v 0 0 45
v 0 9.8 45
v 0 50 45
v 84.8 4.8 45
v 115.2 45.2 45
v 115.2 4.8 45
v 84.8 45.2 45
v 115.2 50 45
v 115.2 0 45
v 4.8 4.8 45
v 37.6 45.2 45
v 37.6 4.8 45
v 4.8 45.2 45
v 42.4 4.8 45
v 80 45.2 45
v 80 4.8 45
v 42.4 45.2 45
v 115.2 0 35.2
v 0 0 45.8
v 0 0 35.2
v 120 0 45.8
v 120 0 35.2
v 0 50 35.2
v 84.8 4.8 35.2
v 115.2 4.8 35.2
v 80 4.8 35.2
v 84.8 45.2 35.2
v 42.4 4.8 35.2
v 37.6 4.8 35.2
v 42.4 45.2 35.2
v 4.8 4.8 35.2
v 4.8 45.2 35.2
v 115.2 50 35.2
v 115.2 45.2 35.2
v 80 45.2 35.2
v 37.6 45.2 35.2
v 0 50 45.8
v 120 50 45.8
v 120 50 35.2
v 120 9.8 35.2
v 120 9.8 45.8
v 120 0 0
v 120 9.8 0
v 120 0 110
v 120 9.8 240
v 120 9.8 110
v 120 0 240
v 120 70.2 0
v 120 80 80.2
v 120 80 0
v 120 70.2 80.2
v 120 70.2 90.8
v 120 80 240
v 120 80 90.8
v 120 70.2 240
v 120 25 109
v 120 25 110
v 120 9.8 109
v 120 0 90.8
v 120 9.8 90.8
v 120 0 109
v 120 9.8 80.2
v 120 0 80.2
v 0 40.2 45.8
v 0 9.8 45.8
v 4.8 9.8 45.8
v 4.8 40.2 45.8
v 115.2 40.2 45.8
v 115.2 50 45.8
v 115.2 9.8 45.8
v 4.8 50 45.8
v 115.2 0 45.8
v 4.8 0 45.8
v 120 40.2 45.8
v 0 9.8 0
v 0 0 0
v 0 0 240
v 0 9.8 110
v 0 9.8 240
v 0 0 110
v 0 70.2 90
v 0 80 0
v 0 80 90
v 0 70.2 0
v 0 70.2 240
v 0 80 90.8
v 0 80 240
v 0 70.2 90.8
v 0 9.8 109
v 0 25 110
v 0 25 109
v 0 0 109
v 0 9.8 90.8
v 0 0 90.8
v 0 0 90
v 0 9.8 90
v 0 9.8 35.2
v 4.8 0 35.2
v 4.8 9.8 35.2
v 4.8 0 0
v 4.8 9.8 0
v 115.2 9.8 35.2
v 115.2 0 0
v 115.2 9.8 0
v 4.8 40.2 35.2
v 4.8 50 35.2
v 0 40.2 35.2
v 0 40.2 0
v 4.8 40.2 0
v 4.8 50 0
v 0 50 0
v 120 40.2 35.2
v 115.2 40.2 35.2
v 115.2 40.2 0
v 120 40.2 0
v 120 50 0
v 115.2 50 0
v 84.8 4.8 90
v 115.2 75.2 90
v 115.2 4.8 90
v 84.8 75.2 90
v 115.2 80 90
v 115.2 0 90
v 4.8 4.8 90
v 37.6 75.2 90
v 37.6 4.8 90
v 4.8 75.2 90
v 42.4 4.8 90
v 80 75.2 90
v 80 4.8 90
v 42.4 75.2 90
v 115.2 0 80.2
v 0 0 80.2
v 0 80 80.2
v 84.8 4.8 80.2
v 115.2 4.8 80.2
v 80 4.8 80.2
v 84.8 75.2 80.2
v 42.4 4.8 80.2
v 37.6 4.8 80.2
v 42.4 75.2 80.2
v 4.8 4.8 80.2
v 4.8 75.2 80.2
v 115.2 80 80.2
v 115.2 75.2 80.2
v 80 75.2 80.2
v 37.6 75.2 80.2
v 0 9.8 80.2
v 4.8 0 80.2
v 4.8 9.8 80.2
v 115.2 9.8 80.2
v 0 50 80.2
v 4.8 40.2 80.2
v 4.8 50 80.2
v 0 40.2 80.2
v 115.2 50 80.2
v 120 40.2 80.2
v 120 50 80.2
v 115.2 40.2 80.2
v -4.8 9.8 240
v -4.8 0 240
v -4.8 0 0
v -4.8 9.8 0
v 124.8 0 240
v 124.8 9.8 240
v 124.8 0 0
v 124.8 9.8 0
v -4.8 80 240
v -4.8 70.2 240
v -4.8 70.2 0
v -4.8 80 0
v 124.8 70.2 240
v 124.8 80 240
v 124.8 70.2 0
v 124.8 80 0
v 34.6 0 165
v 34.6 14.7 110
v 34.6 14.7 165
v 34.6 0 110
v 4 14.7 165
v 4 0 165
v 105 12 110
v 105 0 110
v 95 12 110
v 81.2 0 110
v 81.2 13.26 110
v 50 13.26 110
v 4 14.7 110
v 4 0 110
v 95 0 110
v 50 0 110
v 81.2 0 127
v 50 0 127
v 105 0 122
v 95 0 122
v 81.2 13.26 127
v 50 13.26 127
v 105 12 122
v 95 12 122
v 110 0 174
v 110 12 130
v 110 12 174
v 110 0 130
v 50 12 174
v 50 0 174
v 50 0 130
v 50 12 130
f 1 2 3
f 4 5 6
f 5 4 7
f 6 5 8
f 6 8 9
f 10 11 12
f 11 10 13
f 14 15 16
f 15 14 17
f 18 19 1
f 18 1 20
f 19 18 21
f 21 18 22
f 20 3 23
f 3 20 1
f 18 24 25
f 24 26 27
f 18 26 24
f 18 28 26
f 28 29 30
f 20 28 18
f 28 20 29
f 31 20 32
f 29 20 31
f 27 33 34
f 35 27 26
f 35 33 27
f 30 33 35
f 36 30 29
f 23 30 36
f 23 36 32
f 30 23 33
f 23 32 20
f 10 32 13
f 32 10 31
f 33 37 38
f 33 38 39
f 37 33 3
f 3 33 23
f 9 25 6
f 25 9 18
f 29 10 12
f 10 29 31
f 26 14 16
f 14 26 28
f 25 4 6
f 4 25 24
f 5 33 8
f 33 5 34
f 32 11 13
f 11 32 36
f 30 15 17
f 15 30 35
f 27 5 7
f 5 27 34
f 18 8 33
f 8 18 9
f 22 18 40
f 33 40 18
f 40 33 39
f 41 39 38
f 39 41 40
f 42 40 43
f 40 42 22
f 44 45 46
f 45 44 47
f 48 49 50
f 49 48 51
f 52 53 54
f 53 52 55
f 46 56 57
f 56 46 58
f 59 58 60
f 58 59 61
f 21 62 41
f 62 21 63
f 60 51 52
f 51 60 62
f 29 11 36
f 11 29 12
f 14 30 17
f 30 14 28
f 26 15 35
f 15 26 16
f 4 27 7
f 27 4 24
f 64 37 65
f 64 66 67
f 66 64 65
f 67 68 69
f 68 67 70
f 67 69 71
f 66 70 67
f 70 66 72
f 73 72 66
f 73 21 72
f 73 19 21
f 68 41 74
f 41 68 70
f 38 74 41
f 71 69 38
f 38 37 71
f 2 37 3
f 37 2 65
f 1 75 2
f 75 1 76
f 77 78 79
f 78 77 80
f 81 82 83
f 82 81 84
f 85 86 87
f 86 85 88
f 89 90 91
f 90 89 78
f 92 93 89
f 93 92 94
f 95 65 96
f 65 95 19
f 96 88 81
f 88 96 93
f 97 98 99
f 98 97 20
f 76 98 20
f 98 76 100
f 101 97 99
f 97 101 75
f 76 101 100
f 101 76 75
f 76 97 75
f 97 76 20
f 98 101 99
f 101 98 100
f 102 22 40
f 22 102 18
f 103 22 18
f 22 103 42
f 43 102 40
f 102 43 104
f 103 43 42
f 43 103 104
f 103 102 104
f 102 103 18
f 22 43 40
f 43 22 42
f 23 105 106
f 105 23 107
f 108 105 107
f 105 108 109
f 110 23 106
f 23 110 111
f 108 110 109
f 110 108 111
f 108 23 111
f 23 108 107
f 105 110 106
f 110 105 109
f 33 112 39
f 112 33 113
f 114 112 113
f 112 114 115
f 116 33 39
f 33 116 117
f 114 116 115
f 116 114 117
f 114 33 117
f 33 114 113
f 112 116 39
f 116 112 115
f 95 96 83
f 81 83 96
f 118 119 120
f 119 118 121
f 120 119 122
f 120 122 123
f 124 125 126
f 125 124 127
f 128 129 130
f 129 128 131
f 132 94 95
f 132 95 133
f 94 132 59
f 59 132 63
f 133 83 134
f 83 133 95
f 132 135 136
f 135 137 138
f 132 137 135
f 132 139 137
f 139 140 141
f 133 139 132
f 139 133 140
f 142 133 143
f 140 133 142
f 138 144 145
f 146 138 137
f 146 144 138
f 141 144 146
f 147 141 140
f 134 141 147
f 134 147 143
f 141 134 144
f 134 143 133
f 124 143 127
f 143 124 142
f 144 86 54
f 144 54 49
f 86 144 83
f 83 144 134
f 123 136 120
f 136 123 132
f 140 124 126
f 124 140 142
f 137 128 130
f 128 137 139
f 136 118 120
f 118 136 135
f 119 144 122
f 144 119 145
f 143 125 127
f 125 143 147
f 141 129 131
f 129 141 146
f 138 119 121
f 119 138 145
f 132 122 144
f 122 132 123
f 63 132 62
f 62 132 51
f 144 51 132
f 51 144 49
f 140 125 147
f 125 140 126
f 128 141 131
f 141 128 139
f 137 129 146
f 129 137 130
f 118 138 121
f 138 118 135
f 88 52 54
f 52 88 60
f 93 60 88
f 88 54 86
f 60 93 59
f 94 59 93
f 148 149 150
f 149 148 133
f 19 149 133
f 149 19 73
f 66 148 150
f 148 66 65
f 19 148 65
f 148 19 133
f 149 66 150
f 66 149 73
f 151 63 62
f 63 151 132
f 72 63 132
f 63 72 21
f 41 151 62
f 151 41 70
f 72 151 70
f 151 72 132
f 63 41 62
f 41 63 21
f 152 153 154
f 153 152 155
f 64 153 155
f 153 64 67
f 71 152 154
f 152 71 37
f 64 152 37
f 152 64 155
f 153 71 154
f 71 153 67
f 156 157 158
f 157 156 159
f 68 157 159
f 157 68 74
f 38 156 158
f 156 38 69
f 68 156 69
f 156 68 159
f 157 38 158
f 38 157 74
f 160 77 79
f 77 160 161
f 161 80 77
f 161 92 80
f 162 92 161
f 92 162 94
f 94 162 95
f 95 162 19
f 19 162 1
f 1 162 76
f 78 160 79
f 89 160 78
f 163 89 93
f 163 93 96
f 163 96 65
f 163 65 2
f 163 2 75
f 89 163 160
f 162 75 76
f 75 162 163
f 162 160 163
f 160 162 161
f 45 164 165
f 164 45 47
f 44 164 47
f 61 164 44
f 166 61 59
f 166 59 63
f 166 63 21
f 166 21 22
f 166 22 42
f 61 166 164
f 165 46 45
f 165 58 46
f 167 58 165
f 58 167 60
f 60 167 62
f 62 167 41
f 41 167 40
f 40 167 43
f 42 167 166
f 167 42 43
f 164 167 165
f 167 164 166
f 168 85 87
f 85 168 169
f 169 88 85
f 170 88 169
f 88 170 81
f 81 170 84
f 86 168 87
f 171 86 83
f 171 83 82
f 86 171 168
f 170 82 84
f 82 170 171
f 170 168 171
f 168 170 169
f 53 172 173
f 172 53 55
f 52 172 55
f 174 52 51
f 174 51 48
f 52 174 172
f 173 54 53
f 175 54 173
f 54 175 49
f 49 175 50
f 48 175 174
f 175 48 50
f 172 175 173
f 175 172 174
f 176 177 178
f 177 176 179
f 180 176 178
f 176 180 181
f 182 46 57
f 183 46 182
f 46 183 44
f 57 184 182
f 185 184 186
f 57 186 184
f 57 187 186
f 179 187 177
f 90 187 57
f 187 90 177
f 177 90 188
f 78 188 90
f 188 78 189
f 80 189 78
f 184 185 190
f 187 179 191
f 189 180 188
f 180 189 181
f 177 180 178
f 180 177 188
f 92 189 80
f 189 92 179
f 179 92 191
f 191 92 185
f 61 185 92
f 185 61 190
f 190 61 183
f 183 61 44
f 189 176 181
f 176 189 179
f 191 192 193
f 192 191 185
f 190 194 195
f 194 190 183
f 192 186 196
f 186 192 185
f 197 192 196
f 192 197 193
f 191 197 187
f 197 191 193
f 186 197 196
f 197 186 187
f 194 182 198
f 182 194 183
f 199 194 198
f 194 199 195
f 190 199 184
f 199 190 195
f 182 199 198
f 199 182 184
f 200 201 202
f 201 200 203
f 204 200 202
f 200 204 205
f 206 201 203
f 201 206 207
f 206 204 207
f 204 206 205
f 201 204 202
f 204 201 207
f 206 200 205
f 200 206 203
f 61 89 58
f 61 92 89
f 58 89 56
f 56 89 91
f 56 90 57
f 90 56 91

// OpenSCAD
// file: materials.scad
module twobyfour(length) {
    color("BurlyWood")
    cube([length, 4.8, 9.8]);   
}
// file: tools.scad
module oscilloskop() {
    color("Gray")
    cube([31.2, 13.26, 17]);
}

module sortimentskuff() {
    color("Gray")
    cube([30.6, 14.7, 55]);
}

module hakko_base() {
    color("Blue")
    cube([10, 12, 12]);
}

module dataskjerm() {
    color("Black")
    cube([60, 12, 44]);
}
// main file
use <tools.scad>;
use <materials.scad>;

module support(depth) {
    translate([4.8, 0, 0])
    {
        rotate([0, 0, 90])
            twobyfour(depth);
        twobyfour(120 - 2 * 4.8);
        translate([0, depth - 4.8, 0])
            twobyfour(120 - 2 * 4.8);
    }
    translate([120, 0, 0])
        rotate([0, 0, 90])
            twobyfour(depth);

    translate([42.4, 4.8, 0])
        rotate([0, 0, 90])
            twobyfour(depth - 2 * 4.8);

    translate([84.8, 4.8, 0])
        rotate([0, 0, 90])
            twobyfour(depth - 2 * 4.8);

}

module shelf(width, depth) {
    cube([width, depth, .8]);
}

module shelfwithsupport(width, depth) {
    support(depth);
    translate([0, 0, 9.8])
    shelf(width, depth);
}


// Workbench lower shelf
translate([0, 0, 45 - 9.8])
    shelfwithsupport(120, 50);

translate([4.8, 9.8, 0])
    rotate([90, -90, 0]) {
        twobyfour(45 - 9.8);
        translate([0, -120 + 4.8, 0])
            twobyfour(45 - 9.8);
        
        translate([0, 0, -50 + 9.8])
            twobyfour(45 - 9.8);
    
        translate([0, -120 + 4.8, -50 + 9.8])
            twobyfour(45 - 9.8);
    }

// Workbench main desk
translate([0, 0, 90 - 9.8])
    shelfwithsupport(120, 80);

translate([4.8, 9.8, 45])
    rotate([90, -90, 0]) {
        twobyfour(45 - 9.8);
        translate([0, -120 + 4.8, 0])
            twobyfour(45 - 9.8);
        
        translate([0, 0, -50 + 9.8])
            twobyfour(45 - 9.8);
    
        translate([0, -120 + 4.8, -50 + 9.8])
            twobyfour(45 - 9.8);
    }


translate([0, 9.8, 0])
    rotate([90, -90, 0]) {
        twobyfour(240);
        translate([0, -120 - 4.8, 0])
            twobyfour(240);
        
        translate([0, 0, -80 + 9.8])
            twobyfour(240);
    
        translate([0, -120 - 4.8, -80 + 9.8])
            twobyfour(240);
    }


//twobyfour(350);

//cube([80, 120, 2]);

/* Add some tools to see how it all looks */
translate([4, 0, 110])
sortimentskuff();

translate([50, 0, 110])
oscilloskop();

translate([95, 0, 110])
hakko_base();

translate([50, 0, 130])
dataskjerm();

translate([0, 0, 109])
cube([120, 25, 1]);
